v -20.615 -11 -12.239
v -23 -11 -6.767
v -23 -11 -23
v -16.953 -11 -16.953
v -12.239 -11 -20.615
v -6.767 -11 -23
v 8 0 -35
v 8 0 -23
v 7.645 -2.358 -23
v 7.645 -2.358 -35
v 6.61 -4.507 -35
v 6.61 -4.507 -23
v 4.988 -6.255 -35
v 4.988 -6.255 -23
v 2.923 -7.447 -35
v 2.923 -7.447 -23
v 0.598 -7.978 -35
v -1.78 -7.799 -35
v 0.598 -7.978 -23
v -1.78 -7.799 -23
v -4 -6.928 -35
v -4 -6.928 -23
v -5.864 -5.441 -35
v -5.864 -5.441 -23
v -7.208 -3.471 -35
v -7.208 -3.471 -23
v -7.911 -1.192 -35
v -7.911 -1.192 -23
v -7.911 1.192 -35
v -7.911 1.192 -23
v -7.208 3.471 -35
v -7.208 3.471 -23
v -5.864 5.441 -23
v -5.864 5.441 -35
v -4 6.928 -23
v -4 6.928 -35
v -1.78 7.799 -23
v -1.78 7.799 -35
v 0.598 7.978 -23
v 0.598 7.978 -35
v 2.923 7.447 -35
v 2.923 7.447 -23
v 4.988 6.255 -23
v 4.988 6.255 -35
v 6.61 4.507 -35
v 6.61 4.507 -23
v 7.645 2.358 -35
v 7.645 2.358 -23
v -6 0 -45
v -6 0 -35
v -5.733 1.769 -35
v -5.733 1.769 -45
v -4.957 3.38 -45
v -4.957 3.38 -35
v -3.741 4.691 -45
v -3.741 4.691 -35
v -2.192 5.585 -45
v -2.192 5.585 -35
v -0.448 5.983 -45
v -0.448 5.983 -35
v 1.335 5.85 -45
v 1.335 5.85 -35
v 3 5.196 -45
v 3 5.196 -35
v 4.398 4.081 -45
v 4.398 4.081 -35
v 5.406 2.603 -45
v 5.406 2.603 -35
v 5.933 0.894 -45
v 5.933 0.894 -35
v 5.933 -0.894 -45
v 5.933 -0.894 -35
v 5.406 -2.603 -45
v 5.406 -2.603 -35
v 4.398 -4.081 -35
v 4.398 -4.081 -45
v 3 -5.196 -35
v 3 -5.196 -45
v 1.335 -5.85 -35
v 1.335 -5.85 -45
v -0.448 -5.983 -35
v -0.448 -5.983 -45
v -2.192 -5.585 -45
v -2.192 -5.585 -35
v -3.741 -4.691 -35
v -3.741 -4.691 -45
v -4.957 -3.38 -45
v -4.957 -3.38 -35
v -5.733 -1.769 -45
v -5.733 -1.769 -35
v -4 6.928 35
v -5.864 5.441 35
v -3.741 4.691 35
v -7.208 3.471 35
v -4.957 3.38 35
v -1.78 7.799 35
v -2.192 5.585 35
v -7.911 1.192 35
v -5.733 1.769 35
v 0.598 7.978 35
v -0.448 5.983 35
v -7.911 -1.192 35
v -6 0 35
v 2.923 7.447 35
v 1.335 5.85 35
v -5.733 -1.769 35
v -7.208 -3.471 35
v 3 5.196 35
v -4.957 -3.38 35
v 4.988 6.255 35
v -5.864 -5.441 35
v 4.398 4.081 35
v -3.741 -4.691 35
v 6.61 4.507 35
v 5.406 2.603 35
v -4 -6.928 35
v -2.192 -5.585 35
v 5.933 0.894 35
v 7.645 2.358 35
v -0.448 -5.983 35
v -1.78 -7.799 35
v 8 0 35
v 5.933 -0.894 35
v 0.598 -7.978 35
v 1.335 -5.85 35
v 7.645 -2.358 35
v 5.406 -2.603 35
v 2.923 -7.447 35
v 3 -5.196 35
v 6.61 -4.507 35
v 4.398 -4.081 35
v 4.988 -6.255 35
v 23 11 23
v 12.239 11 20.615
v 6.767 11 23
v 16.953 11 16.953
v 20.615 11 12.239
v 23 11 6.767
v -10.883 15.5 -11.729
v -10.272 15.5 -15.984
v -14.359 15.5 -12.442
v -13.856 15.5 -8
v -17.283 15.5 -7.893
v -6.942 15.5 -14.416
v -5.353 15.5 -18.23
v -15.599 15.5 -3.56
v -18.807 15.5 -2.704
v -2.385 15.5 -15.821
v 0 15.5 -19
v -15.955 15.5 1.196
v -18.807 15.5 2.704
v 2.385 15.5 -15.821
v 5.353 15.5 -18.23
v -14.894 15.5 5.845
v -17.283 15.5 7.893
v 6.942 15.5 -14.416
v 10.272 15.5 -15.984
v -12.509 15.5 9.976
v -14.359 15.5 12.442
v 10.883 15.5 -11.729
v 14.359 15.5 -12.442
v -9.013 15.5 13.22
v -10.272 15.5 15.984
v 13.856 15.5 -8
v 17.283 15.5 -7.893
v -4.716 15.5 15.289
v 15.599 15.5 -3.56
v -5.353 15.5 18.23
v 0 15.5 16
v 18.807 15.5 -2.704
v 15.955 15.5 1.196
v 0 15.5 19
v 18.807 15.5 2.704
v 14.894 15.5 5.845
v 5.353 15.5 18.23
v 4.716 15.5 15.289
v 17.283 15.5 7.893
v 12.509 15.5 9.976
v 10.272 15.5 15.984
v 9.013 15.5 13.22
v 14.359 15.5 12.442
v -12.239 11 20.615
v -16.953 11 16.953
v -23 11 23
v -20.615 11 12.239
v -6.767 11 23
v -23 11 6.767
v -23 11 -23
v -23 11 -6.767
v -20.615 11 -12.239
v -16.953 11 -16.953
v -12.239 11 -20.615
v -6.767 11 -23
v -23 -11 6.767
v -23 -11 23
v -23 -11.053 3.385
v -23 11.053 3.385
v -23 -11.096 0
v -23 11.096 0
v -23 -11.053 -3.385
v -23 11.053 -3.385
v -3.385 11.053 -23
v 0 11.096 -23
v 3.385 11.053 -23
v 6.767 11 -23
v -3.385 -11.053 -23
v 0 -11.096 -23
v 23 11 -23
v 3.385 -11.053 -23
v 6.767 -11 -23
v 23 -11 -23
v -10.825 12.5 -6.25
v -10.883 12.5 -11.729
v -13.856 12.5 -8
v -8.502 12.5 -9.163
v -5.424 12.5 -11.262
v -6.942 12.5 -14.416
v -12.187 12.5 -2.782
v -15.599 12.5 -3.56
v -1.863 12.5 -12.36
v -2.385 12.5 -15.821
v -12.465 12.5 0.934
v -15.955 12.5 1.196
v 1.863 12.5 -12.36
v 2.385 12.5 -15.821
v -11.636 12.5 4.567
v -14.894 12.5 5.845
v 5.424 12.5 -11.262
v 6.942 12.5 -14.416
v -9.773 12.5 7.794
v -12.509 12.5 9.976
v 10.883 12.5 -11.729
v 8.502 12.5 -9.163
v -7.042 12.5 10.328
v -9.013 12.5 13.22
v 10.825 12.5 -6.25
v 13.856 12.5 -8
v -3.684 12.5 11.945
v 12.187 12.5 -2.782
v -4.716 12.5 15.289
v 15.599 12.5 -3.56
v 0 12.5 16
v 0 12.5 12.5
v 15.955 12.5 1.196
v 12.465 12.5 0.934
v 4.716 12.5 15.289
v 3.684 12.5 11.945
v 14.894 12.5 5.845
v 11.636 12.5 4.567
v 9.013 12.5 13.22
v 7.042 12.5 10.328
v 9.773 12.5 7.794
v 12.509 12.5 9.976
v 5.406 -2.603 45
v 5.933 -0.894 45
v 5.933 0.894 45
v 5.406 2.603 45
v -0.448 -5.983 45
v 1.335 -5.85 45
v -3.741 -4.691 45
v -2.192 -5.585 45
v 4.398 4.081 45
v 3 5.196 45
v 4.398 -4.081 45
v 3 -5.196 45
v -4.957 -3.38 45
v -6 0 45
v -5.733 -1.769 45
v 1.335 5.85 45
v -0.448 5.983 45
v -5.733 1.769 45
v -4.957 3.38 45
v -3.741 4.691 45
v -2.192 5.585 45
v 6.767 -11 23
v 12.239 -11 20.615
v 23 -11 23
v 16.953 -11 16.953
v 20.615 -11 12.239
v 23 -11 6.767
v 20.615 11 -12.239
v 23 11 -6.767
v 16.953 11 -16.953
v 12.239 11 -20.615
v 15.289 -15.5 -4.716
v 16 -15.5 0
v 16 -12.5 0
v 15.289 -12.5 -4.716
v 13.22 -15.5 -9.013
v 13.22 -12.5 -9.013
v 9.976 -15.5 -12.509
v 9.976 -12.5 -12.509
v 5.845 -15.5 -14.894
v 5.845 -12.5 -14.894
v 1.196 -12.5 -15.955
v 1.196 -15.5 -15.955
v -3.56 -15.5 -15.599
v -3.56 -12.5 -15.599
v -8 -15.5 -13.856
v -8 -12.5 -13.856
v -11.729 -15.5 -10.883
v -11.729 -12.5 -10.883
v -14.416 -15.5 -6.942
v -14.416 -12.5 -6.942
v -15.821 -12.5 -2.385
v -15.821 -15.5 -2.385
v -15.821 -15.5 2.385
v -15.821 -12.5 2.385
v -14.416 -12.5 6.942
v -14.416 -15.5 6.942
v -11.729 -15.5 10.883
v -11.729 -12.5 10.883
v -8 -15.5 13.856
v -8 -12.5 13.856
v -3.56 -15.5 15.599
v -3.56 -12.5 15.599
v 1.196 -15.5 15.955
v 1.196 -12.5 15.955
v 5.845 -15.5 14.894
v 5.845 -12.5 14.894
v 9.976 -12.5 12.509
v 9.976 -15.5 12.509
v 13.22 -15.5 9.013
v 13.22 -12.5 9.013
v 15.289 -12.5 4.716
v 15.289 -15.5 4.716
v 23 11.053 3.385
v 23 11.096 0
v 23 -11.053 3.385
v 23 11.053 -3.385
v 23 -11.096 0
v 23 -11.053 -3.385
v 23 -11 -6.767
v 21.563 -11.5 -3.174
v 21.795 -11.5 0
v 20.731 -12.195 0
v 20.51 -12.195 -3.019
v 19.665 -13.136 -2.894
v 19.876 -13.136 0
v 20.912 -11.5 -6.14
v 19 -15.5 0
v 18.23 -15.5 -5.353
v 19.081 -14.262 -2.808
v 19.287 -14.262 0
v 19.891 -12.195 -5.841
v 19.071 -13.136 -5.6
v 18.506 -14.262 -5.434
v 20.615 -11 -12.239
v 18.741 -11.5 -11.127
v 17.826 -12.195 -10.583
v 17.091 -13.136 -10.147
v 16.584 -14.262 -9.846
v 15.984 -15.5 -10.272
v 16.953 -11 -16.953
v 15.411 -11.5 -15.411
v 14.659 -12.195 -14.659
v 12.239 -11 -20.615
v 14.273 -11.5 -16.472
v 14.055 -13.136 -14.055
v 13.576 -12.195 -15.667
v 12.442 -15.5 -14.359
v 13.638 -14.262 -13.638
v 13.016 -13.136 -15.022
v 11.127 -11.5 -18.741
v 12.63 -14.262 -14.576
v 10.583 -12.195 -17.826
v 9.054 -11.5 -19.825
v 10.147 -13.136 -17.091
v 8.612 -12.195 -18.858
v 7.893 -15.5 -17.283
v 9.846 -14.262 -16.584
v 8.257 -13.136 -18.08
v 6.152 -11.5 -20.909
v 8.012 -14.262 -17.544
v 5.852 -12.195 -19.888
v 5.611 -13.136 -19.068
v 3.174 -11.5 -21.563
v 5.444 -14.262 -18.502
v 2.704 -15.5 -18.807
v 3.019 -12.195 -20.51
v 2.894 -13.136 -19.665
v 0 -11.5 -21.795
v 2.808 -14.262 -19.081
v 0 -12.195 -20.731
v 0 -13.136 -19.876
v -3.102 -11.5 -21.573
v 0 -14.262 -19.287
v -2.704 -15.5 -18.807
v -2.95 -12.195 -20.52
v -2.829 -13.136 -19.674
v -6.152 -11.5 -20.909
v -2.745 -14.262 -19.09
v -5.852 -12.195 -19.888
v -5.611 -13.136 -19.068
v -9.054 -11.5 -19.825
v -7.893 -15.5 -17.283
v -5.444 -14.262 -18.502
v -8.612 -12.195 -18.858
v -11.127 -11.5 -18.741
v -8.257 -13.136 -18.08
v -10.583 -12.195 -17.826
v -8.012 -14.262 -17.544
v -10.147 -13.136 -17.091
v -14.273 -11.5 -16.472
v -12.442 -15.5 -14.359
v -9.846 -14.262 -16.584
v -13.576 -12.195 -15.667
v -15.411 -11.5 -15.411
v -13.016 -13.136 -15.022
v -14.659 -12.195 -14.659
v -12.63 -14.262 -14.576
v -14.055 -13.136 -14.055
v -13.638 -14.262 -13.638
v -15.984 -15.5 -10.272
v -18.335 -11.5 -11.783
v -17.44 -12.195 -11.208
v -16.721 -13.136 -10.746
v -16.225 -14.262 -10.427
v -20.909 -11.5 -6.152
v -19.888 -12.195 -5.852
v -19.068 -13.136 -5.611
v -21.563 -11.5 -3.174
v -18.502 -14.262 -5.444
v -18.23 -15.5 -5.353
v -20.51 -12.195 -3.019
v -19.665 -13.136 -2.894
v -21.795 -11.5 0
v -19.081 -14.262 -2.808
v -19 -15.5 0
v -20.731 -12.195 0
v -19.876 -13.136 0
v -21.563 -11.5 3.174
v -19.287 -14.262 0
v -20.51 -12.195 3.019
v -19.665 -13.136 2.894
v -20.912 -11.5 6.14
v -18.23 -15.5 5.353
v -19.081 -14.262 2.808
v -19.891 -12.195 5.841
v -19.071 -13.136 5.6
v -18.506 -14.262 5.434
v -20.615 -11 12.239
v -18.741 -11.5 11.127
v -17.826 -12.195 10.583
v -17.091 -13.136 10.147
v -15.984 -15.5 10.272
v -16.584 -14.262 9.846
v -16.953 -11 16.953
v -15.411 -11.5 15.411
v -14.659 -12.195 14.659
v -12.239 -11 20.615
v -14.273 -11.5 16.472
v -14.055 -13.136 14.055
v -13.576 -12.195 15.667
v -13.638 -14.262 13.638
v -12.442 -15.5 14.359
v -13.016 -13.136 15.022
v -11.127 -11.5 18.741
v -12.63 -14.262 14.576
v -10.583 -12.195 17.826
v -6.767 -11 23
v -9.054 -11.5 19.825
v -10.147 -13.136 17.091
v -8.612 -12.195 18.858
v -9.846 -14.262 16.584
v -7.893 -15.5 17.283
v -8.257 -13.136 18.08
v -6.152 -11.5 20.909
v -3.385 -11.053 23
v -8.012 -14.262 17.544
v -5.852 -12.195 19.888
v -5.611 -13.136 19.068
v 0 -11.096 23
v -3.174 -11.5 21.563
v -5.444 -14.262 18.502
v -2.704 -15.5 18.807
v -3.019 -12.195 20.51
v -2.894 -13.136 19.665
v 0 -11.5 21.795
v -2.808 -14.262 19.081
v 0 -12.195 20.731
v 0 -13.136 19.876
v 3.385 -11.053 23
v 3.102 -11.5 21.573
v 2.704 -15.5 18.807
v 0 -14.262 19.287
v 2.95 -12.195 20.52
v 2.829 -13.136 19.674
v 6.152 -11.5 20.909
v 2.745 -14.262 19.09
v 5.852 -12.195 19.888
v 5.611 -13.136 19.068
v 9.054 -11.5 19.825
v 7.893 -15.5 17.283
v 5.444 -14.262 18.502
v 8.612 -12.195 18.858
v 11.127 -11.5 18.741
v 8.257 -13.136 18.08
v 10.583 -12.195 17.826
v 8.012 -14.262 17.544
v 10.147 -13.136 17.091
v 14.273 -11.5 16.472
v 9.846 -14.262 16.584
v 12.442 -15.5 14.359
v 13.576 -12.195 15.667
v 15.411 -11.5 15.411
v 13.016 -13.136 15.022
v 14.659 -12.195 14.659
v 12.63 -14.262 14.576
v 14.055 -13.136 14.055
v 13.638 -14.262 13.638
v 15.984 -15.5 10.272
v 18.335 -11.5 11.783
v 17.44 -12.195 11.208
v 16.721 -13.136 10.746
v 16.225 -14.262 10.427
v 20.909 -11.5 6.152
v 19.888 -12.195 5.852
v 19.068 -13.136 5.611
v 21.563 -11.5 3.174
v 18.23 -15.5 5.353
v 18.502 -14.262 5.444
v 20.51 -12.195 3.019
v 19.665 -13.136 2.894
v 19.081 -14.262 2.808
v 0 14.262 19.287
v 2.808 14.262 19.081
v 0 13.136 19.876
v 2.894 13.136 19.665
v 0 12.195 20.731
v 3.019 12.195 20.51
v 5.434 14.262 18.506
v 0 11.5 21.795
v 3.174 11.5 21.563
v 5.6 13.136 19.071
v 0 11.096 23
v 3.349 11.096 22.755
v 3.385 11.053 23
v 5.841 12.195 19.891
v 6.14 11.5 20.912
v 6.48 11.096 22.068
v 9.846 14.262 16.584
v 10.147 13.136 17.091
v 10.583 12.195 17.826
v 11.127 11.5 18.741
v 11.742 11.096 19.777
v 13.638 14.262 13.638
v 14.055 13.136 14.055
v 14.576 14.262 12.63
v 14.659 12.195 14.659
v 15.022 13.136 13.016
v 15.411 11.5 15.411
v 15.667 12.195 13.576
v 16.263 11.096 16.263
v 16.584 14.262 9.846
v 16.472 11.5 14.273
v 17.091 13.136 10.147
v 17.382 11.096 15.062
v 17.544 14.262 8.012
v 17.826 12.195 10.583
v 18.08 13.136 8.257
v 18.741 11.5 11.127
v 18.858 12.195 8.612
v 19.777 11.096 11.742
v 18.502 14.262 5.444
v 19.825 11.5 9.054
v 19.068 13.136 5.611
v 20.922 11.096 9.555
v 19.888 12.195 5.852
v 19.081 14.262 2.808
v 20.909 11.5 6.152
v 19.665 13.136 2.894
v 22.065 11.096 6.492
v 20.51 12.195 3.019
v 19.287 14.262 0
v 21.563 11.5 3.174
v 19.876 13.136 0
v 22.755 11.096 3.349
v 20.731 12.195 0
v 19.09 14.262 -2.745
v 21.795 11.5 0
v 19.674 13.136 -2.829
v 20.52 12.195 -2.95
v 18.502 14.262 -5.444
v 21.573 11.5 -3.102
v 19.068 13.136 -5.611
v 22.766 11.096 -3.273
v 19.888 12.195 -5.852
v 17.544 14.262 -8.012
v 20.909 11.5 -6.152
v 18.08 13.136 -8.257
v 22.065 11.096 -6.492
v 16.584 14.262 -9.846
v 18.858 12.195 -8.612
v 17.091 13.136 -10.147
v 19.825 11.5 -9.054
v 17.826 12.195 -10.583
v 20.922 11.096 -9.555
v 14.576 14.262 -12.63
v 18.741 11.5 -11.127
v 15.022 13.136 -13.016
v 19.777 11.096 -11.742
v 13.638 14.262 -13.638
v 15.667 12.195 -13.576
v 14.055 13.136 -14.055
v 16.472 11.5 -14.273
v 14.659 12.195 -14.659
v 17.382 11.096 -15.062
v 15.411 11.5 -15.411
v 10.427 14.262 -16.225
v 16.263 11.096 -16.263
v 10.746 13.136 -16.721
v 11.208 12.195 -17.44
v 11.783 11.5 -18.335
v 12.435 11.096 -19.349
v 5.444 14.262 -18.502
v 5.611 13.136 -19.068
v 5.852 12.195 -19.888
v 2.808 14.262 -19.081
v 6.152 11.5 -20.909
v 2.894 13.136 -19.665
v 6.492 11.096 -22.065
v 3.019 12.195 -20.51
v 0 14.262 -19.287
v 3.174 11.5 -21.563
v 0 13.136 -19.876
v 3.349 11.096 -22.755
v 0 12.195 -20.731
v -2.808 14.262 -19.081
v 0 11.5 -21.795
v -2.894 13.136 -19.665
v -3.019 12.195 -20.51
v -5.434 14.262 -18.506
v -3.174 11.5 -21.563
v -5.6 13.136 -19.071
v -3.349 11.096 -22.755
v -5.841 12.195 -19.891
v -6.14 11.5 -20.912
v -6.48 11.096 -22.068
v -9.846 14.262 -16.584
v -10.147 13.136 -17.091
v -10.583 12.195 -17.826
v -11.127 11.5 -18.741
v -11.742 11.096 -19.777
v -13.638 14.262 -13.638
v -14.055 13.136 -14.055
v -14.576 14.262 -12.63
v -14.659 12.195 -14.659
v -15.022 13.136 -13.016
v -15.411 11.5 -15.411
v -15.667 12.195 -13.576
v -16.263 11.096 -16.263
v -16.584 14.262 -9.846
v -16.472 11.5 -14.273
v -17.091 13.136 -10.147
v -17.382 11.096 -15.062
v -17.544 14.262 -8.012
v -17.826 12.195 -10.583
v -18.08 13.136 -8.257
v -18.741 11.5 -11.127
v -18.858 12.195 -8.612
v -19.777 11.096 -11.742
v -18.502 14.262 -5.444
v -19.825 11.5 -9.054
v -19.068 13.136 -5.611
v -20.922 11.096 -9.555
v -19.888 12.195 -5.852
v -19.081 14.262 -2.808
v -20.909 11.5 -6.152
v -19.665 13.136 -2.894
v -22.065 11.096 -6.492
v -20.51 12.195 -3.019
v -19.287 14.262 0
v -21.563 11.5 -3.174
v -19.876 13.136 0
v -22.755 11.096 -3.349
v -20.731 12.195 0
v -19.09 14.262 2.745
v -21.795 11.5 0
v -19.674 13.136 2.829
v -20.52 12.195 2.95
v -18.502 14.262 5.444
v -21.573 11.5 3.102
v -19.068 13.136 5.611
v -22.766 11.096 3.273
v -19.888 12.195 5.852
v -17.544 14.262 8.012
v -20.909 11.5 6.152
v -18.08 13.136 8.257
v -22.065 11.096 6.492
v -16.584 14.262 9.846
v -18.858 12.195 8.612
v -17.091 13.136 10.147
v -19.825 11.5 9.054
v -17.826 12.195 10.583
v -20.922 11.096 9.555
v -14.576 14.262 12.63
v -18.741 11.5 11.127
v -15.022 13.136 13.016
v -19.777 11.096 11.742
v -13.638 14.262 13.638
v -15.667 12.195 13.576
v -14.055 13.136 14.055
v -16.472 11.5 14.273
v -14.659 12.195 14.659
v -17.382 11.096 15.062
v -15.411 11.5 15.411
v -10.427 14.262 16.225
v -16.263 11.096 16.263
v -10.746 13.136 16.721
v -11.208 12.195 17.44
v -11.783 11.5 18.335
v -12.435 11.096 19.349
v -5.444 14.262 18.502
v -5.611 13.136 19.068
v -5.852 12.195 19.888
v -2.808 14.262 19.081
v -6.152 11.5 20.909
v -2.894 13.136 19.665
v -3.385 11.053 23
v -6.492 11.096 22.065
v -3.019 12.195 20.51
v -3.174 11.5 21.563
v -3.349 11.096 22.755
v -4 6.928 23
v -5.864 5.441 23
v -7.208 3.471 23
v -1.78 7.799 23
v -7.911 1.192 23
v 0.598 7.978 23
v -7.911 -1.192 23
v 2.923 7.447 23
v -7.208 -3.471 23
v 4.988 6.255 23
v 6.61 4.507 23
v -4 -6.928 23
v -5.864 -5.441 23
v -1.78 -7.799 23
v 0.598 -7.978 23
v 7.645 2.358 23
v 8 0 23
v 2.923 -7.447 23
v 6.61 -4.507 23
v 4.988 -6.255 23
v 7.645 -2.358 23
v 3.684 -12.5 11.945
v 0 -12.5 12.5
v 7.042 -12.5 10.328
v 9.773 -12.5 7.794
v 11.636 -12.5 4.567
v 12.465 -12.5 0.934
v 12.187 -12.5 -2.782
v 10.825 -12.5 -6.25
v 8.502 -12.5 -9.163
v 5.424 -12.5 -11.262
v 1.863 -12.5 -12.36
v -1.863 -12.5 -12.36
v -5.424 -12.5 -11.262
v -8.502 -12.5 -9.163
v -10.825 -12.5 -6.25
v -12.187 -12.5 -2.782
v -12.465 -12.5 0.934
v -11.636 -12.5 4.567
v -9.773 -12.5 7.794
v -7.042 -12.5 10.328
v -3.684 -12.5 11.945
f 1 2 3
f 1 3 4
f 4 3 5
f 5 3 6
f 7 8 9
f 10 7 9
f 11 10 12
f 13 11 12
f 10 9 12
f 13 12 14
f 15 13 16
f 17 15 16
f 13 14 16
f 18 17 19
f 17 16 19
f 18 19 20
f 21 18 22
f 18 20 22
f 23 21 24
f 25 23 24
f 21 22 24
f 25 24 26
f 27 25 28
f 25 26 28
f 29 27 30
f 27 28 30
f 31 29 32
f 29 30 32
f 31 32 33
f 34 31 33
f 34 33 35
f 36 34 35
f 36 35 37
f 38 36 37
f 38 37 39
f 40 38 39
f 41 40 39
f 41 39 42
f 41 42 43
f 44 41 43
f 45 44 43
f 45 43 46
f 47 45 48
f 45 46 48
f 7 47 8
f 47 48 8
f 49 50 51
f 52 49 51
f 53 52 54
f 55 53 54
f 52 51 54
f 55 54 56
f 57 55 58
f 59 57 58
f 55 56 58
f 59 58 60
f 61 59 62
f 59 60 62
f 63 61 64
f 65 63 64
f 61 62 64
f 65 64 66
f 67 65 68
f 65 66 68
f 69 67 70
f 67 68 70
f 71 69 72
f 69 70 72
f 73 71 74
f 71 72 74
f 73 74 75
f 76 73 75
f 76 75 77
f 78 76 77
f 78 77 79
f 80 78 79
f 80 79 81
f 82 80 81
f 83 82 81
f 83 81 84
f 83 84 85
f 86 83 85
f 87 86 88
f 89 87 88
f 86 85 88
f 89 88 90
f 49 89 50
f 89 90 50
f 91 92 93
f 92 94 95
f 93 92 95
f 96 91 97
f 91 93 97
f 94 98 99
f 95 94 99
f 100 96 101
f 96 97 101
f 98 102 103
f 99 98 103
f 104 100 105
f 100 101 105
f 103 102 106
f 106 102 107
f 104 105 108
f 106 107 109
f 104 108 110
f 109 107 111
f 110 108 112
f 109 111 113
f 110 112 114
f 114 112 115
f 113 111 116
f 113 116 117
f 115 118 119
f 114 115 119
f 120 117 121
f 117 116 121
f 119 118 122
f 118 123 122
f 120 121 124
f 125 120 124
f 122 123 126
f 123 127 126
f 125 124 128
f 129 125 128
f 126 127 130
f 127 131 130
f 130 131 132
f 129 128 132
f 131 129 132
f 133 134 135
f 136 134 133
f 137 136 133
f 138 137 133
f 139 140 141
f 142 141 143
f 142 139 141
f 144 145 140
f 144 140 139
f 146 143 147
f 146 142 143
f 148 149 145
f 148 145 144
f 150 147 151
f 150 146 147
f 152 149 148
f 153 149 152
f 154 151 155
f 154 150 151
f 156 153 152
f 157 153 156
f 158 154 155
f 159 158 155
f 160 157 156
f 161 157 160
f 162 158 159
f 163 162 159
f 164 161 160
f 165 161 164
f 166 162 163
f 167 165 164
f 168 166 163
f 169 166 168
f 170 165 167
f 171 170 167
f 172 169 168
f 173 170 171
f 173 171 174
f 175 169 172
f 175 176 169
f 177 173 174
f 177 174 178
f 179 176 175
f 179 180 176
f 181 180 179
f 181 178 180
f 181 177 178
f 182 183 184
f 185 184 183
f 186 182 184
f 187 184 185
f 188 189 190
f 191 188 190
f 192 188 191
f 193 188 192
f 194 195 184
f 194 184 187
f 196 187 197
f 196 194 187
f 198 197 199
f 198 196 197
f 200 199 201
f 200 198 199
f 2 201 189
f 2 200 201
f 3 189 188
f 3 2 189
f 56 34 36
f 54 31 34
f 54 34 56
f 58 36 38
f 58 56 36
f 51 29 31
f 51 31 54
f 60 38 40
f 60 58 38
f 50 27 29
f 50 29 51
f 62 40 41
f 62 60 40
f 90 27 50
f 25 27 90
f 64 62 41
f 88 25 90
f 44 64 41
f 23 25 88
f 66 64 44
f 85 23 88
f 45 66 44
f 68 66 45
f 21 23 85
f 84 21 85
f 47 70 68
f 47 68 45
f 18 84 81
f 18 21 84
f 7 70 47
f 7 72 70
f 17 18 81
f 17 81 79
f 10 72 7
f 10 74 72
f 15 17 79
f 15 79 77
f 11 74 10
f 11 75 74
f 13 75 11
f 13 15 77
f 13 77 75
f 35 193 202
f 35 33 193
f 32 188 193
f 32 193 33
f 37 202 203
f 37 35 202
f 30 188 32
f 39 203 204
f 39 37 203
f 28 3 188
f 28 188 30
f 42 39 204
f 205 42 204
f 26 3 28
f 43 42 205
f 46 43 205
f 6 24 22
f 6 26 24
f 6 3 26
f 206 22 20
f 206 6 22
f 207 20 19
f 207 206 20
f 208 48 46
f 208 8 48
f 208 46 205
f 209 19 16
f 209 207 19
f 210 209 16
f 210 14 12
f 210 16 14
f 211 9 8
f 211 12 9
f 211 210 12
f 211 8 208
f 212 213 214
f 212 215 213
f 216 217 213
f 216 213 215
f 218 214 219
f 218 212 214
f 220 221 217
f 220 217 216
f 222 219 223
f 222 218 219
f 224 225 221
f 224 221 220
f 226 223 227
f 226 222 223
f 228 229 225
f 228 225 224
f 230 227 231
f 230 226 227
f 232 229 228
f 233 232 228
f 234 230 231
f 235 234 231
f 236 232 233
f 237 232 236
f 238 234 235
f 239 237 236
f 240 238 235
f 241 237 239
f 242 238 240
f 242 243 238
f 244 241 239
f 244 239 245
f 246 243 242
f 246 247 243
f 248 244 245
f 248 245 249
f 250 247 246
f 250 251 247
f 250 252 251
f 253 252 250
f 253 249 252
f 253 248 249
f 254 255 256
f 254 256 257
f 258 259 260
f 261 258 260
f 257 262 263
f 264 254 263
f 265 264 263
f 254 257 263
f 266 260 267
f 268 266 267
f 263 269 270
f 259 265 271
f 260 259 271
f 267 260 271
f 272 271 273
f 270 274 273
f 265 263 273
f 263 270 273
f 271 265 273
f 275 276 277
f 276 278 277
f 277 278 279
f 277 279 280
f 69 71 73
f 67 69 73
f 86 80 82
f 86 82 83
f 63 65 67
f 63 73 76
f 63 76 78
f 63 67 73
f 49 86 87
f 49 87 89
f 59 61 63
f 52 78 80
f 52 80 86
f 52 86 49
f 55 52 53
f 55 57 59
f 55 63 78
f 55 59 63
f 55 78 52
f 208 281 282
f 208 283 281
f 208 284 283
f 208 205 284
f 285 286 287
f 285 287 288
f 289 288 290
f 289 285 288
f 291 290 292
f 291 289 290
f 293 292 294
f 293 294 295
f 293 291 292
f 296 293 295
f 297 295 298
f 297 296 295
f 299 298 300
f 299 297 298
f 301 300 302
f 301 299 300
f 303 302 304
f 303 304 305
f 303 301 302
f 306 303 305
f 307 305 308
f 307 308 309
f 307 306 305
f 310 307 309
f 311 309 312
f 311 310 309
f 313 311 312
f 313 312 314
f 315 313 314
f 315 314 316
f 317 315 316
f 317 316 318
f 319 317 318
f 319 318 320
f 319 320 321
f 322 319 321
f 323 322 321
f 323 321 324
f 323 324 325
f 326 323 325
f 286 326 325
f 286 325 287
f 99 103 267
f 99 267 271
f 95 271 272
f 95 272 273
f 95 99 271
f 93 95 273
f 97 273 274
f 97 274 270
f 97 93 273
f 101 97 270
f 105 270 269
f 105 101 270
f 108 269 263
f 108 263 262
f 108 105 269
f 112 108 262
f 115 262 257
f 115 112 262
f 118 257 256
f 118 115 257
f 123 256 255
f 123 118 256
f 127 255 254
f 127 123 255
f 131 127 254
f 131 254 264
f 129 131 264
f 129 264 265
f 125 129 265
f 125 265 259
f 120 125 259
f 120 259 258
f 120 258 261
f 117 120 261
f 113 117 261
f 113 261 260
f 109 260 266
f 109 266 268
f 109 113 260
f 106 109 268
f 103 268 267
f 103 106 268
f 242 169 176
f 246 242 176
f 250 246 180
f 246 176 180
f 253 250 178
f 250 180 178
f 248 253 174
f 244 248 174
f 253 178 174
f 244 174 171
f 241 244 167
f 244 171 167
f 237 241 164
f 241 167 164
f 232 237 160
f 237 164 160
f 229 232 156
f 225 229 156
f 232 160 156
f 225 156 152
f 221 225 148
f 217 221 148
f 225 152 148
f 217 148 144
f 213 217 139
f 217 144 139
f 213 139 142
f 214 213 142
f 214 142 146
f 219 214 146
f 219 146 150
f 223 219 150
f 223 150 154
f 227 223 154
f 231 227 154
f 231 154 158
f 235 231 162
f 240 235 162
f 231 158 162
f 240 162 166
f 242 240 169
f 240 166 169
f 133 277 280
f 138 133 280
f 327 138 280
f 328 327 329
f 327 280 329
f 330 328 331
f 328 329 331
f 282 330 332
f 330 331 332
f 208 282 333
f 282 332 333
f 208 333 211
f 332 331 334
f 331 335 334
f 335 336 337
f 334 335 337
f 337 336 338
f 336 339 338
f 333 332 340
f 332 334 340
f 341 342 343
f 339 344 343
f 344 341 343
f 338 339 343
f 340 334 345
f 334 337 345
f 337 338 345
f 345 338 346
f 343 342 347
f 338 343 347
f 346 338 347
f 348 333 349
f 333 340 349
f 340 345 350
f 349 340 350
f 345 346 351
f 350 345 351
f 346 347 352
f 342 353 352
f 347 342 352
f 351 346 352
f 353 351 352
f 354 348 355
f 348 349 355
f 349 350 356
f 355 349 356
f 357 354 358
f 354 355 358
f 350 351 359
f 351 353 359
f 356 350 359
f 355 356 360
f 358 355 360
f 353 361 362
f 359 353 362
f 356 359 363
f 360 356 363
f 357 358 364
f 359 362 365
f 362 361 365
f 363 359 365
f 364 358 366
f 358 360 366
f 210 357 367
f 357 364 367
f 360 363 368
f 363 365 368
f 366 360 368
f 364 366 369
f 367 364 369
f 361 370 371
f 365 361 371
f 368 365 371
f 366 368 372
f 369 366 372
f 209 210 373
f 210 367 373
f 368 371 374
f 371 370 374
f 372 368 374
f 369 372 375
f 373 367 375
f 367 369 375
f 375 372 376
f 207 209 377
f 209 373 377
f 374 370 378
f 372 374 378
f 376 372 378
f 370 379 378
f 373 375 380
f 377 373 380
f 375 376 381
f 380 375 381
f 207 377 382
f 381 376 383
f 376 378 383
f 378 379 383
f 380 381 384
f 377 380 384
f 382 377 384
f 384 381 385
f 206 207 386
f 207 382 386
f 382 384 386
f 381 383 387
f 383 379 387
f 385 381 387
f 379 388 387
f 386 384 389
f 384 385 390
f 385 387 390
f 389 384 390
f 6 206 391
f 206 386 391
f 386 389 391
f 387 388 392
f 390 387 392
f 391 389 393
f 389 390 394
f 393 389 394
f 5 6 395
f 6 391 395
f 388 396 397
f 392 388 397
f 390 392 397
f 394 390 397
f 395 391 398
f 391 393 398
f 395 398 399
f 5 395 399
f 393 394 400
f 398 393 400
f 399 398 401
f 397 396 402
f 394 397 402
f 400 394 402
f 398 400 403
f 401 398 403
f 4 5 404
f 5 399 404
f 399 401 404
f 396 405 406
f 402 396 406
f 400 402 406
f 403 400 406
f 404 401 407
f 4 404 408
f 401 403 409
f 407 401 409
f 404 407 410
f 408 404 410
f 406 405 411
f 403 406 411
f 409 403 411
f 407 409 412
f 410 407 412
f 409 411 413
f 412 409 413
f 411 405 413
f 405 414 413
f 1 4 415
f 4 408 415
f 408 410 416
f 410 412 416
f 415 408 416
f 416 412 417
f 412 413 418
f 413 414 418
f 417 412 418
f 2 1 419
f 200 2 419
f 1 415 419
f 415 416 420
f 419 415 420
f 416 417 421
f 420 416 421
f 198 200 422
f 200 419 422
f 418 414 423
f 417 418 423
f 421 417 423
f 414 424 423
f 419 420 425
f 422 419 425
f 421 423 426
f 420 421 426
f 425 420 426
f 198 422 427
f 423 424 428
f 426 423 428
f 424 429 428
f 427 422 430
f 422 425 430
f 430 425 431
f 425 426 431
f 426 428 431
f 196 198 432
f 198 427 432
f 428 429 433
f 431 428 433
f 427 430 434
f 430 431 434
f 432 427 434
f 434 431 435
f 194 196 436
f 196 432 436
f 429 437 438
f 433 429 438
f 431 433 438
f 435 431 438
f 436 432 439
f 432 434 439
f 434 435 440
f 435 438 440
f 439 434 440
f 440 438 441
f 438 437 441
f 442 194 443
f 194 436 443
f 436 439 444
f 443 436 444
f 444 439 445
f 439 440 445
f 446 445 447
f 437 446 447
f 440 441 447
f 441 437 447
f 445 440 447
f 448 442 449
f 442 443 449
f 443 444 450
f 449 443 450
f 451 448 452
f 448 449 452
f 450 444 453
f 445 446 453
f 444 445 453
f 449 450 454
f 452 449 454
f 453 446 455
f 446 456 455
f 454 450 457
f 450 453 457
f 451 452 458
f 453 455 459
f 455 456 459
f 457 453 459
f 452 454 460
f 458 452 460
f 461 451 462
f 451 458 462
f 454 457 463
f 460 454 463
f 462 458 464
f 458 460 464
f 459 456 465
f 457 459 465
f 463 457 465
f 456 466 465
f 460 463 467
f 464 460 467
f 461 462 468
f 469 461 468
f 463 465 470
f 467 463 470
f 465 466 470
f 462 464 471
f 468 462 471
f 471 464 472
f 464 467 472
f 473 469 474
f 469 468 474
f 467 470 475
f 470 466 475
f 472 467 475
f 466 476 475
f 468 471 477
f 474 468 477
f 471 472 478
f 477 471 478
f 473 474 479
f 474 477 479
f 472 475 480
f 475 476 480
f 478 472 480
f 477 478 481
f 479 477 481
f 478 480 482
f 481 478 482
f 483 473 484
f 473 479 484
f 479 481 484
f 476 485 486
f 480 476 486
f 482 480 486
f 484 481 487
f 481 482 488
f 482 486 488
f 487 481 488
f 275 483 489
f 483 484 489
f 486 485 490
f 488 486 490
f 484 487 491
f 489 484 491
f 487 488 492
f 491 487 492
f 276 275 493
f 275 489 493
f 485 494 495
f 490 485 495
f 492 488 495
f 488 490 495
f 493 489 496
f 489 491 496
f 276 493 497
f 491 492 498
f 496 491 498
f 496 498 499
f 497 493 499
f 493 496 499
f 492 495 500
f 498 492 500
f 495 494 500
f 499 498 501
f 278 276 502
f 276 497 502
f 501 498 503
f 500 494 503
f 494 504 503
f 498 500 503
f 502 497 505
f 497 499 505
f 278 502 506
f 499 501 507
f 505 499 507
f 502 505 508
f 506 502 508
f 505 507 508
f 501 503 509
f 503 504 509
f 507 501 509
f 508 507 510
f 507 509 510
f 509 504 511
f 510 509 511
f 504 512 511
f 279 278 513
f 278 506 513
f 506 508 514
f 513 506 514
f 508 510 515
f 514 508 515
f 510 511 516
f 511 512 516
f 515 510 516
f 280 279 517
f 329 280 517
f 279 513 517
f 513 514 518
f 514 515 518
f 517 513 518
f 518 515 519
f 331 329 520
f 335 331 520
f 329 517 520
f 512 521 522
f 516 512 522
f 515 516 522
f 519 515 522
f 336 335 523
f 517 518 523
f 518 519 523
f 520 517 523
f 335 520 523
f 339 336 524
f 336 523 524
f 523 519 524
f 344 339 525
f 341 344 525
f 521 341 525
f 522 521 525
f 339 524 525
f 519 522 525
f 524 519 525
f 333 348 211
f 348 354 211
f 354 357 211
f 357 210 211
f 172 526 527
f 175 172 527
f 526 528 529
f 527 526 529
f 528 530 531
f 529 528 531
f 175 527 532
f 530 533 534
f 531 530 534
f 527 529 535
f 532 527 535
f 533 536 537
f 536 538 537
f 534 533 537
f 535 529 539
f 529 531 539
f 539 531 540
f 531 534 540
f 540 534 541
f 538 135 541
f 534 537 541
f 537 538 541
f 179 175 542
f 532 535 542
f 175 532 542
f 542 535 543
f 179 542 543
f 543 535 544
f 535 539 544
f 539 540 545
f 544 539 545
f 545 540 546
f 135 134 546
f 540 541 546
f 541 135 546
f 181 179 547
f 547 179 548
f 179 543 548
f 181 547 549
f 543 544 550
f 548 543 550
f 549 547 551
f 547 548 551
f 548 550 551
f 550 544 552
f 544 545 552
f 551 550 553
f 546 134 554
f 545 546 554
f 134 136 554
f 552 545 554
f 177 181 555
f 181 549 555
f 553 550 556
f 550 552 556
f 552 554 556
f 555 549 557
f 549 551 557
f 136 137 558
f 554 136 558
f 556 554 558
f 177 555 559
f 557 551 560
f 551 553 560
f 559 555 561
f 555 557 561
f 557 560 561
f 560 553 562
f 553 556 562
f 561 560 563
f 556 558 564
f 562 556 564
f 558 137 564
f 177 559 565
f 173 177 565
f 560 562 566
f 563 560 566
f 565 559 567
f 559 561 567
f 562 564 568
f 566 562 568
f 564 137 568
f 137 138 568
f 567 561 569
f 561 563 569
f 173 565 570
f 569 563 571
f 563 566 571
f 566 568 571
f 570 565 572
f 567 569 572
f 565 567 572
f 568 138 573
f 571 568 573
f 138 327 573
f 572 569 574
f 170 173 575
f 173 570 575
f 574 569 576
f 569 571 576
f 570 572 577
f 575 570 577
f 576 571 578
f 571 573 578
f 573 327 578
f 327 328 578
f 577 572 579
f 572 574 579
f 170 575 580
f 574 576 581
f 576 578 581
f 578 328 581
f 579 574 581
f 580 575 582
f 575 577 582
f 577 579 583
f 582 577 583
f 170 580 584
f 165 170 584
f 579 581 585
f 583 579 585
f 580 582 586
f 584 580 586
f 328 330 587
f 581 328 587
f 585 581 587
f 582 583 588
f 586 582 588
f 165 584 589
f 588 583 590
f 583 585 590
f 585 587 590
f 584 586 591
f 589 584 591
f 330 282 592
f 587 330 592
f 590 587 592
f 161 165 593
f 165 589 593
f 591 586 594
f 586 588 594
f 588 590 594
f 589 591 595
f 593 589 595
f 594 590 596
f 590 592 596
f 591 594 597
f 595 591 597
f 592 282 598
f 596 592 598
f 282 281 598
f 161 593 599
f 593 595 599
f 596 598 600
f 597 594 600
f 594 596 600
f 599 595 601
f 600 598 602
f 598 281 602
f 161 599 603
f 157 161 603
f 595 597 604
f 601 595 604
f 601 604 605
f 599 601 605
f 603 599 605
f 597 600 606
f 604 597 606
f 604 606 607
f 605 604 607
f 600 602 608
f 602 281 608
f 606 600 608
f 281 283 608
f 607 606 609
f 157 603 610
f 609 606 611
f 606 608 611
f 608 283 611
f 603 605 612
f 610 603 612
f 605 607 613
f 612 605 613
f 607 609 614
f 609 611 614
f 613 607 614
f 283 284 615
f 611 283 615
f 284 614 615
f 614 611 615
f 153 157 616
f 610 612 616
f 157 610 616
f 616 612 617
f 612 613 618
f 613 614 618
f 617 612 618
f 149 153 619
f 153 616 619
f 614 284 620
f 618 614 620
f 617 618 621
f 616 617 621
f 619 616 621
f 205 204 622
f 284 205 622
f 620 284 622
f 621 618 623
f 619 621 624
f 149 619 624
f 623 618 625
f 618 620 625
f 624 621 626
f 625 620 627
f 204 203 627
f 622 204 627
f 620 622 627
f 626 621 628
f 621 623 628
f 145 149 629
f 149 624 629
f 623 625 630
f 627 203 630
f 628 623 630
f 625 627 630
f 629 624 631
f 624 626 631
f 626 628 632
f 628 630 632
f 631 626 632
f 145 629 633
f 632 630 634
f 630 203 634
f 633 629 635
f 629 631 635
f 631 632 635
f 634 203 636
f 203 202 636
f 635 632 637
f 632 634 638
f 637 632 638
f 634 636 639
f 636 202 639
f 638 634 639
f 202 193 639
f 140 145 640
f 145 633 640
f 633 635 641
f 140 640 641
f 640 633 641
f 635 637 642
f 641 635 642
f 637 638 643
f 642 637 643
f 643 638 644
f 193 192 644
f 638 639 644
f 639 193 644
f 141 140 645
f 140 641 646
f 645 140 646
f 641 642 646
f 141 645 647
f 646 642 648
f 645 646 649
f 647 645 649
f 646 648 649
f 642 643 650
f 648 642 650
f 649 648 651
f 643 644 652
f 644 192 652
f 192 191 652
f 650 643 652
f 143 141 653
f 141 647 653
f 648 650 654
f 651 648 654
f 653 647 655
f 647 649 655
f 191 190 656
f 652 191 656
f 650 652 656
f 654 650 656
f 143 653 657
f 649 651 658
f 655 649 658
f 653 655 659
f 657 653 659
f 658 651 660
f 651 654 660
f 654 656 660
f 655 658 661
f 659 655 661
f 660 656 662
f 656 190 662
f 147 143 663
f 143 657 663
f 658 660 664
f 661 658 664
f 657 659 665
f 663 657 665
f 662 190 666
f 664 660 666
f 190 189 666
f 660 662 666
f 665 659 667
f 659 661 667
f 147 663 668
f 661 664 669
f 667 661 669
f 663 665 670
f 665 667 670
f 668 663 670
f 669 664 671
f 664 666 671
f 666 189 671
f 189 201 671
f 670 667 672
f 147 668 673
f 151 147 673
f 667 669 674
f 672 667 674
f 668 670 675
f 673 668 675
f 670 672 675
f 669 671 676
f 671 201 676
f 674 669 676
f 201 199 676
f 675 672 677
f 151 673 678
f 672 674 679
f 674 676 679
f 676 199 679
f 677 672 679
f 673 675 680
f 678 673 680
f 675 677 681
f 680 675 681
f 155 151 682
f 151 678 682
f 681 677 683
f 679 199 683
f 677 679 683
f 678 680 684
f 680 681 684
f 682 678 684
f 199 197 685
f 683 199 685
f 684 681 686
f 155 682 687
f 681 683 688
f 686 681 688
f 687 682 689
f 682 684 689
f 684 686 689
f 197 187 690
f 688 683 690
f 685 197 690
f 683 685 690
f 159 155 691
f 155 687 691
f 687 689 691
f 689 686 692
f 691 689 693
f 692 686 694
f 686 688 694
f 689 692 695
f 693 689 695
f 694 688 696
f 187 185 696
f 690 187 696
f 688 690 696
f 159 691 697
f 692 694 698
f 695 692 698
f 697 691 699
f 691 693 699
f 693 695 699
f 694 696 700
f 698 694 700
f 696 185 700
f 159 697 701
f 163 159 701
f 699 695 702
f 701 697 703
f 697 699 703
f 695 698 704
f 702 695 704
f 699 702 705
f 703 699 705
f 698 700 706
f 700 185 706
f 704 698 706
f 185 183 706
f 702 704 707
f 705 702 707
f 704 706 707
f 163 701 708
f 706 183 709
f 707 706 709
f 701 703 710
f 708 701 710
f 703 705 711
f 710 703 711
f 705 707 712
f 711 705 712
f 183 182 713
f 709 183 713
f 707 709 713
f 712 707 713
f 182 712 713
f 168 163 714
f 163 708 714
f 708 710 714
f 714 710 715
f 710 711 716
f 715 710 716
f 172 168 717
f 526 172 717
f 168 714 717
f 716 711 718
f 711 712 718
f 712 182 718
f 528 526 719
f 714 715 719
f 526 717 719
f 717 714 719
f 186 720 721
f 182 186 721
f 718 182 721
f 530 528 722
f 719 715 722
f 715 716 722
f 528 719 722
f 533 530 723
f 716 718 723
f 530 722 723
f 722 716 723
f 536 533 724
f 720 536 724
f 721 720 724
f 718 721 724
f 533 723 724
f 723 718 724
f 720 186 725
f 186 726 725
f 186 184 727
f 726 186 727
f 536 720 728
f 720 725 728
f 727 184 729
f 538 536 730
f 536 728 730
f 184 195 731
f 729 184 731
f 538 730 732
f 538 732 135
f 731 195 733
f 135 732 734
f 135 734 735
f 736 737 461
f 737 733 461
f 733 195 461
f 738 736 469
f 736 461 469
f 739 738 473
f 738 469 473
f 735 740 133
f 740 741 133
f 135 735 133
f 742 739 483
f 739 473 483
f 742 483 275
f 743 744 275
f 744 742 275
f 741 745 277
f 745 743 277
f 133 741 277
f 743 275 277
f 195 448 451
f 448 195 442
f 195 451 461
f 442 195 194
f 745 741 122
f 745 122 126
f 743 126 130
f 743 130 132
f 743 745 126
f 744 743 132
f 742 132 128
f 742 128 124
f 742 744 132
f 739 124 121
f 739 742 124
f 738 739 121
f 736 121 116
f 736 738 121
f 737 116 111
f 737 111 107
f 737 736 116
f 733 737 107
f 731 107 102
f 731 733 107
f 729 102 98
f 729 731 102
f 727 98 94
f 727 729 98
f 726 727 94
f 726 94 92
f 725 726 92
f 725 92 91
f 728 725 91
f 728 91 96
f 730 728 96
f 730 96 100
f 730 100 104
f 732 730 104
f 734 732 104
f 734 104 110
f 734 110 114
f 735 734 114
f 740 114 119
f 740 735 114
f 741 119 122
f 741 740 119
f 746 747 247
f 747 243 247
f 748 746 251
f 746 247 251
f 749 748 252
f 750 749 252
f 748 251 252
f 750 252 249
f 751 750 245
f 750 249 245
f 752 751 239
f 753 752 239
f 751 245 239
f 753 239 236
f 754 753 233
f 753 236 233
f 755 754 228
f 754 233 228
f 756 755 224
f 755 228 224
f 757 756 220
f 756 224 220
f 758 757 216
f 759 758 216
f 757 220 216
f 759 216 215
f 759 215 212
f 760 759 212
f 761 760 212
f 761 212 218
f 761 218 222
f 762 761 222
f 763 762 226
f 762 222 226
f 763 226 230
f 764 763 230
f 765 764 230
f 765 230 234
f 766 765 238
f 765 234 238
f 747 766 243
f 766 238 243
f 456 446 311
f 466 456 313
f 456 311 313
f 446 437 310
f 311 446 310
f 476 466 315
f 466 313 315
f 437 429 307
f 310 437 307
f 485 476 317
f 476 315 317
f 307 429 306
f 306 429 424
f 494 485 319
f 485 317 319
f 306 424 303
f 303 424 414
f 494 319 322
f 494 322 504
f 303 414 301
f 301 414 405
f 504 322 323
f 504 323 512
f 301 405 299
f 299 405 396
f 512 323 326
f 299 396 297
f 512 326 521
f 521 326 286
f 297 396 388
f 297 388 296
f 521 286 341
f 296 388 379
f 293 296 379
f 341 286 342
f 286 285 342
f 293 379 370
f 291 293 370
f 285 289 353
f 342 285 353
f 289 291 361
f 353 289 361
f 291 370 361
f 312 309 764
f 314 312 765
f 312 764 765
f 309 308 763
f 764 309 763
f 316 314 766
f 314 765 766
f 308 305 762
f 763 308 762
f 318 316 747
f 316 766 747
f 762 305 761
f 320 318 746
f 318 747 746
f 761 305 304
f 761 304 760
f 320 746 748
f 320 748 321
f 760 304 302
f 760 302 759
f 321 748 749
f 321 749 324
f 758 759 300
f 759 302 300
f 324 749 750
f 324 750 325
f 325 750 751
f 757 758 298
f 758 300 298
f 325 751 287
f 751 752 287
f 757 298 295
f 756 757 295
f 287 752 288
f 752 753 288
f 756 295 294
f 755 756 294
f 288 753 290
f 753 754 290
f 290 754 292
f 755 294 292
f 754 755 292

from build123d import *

# Parameters (mm, degrees)
SKETCH1_W           = 46
SKETCH1_H           = 46
BOSS_EXTRUDE1_DEPTH = 11
SKETCH2_R           = 19
BOSS_EXTRUDE2_DEPTH = 4.5
FILLET1_R           = 5
SKETCH3_R           = 16
CUT_EXTRUDE1_DEPTH  = 3
SKETCH4_R           = 12.5
CUT_EXTRUDE2_DEPTH  = 41.127920628
MIRROR1_START       = -12.5
MIRROR1_OUTLINE_R   = 16
MIRROR1_DEPTH       = 23.5
MIRROR1_START_2     = -15.5
MIRROR1_2_OUTLINE_W = 46
MIRROR1_2_OUTLINE_H = 46
MIRROR1_2_OUTLINE_R = 16
MIRROR1_2_DEPTH     = 4.5
SKETCH5_R           = 12.5
CUT_EXTRUDE3_DEPTH  = 42.955333564
SKETCH6_R           = 8
BOSS_EXTRUDE3_DEPTH = 12
SKETCH7_R           = 6
BOSS_EXTRUDE4_DEPTH = 10


with BuildPart() as part:
    # Sketch1 → Boss-Extrude1 (new, symmetric)
    with BuildSketch(Plane(origin=(0, 0, 0), x_dir=(1, 0, 0), z_dir=(0, 1, 0))):
        Rectangle(SKETCH1_W, SKETCH1_H)
    extrude(amount=BOSS_EXTRUDE1_DEPTH, both=True)

    # Sketch2 → Boss-Extrude2 (add)
    with BuildSketch(Plane(origin=(0, 11, 0), x_dir=(1, 0, 0), z_dir=(0, 1, 0))):
        with Locations(Location((0, 0, 0), (0, 0, 270))):
            Circle(SKETCH2_R)
    extrude(amount=BOSS_EXTRUDE2_DEPTH)

    # Fillet1
    # the kernel refuses this fillet: 5 mm, written as the material it adds along each edge
    with BuildSketch(Plane(origin=(0, 11, 0), x_dir=(0, 0, 1), z_dir=(-1, 0, 0))) as fillet1_piece_1_section:
        with BuildLine():
            CenterArc((23.974937186, 5), FILLET1_R, 185.739170477, 84.260829523)
            Line((19, 4.5), (19, 0))
            Line((19, 0), (23.974937186, 0))
        make_face()
    fillet1_piece_1 = revolve(axis=Axis((0, 11, 0), (0, 1, 0)), mode=Mode.PRIVATE)
    fillet1_piece_1 = split(fillet1_piece_1, bisect_by=Plane(origin=(0, 11, 23), z_dir=(0, 0, -1)), keep=Keep.TOP, mode=Mode.PRIVATE)
    fillet1_piece_1 = split(fillet1_piece_1, bisect_by=Plane(origin=(23, 11, 0), z_dir=(-1, 0, 0)), keep=Keep.TOP, mode=Mode.PRIVATE)
    fillet1_piece_1 = split(fillet1_piece_1, bisect_by=Plane(origin=(-23, 11, 0), z_dir=(1, 0, 0)), keep=Keep.TOP, mode=Mode.PRIVATE)
    fillet1_piece_1 = split(fillet1_piece_1, bisect_by=Plane(origin=(0, 11, -23), z_dir=(0, 0, 1)), keep=Keep.TOP, mode=Mode.PRIVATE)
    add(fillet1_piece_1)

    # Sketch3 → Cut-Extrude1 (cut)
    with BuildSketch(Plane(origin=(0, 15.5, 0), x_dir=(1, 0, 0), z_dir=(0, 1, 0))):
        with Locations(Location((0, 0, 0), (0, 0, 270))):
            Circle(SKETCH3_R)
    extrude(amount=-CUT_EXTRUDE1_DEPTH, mode=Mode.SUBTRACT)

    # Sketch4 → Cut-Extrude2 (cut, through all)
    with BuildSketch(Plane(origin=(0, 12.5, 0), x_dir=(1, 0, 0), z_dir=(0, 1, 0))):
        with Locations(Location((0, 0, 0), (0, 0, 270))):
            Circle(SKETCH4_R)
    extrude(amount=-CUT_EXTRUDE2_DEPTH, mode=Mode.SUBTRACT)

    # Mirror1: read off the stored shape, not the designer's step
    # Mirror1 outline → Mirror1 (add)
    with BuildSketch(Plane(origin=(0, 0, 0), x_dir=(1, 0, 0), z_dir=(0, 1, 0)).offset(MIRROR1_START)):
        Circle(MIRROR1_OUTLINE_R)
    extrude(amount=MIRROR1_DEPTH)

    # Mirror1 2 outline → Mirror1 2 (add)
    with BuildSketch(Plane(origin=(0, 0, 0), x_dir=(1, 0, 0), z_dir=(0, 1, 0)).offset(MIRROR1_START_2)):
        Rectangle(MIRROR1_2_OUTLINE_W, MIRROR1_2_OUTLINE_H)
        Circle(MIRROR1_2_OUTLINE_R, mode=Mode.SUBTRACT)
    extrude(amount=MIRROR1_2_DEPTH)

    # Mirror1 3 outline → Mirror1 3 (revolve, cut)
    with BuildSketch(Plane.XY):
        with BuildLine():
            Line((32.526911935, -11), (23.974937186, -11))
            ThreePointArc((23.974937186, -11), (20.620835219, -12.291900756), (19, -15.5))
            Line((19, -15.5), (32.526911935, -15.5))
            Line((32.526911935, -15.5), (32.526911935, -11))
        make_face()
    revolve(axis=Axis((0, 0, 0), (0, 1, 0)), mode=Mode.SUBTRACT)

    # Sketch5 → Cut-Extrude3 (cut, through all)
    with BuildSketch(Plane(origin=(0, 11, 0), x_dir=(1, 0, 0), z_dir=(0, 1, 0))):
        with Locations(Location((0, 0, 0), (0, 0, 270))):
            Circle(SKETCH5_R)
    extrude(amount=-CUT_EXTRUDE3_DEPTH, mode=Mode.SUBTRACT)

    # Sketch6 → Boss-Extrude3 (add)
    with BuildSketch(Plane(origin=(0, 0, -23), x_dir=(-1, 0, 0), z_dir=(0, 0, -1))):
        with Locations(Location((0, 0, 0), (0, 0, 180))):
            Circle(SKETCH6_R)
    boss_extrude3 = extrude(amount=BOSS_EXTRUDE3_DEPTH)

    # Sketch7 → Boss-Extrude4 (add)
    with BuildSketch(Plane(origin=(0, 0, -35), x_dir=(-1, 0, 0), z_dir=(0, 0, -1))):
        Circle(SKETCH7_R)
    boss_extrude4 = extrude(amount=BOSS_EXTRUDE4_DEPTH)

    # Mirror2: Boss-Extrude3, Boss-Extrude4 across plane
    add(boss_extrude3.mirror(Plane.XY))
    add(boss_extrude4.mirror(Plane.XY))


solid = part.part
